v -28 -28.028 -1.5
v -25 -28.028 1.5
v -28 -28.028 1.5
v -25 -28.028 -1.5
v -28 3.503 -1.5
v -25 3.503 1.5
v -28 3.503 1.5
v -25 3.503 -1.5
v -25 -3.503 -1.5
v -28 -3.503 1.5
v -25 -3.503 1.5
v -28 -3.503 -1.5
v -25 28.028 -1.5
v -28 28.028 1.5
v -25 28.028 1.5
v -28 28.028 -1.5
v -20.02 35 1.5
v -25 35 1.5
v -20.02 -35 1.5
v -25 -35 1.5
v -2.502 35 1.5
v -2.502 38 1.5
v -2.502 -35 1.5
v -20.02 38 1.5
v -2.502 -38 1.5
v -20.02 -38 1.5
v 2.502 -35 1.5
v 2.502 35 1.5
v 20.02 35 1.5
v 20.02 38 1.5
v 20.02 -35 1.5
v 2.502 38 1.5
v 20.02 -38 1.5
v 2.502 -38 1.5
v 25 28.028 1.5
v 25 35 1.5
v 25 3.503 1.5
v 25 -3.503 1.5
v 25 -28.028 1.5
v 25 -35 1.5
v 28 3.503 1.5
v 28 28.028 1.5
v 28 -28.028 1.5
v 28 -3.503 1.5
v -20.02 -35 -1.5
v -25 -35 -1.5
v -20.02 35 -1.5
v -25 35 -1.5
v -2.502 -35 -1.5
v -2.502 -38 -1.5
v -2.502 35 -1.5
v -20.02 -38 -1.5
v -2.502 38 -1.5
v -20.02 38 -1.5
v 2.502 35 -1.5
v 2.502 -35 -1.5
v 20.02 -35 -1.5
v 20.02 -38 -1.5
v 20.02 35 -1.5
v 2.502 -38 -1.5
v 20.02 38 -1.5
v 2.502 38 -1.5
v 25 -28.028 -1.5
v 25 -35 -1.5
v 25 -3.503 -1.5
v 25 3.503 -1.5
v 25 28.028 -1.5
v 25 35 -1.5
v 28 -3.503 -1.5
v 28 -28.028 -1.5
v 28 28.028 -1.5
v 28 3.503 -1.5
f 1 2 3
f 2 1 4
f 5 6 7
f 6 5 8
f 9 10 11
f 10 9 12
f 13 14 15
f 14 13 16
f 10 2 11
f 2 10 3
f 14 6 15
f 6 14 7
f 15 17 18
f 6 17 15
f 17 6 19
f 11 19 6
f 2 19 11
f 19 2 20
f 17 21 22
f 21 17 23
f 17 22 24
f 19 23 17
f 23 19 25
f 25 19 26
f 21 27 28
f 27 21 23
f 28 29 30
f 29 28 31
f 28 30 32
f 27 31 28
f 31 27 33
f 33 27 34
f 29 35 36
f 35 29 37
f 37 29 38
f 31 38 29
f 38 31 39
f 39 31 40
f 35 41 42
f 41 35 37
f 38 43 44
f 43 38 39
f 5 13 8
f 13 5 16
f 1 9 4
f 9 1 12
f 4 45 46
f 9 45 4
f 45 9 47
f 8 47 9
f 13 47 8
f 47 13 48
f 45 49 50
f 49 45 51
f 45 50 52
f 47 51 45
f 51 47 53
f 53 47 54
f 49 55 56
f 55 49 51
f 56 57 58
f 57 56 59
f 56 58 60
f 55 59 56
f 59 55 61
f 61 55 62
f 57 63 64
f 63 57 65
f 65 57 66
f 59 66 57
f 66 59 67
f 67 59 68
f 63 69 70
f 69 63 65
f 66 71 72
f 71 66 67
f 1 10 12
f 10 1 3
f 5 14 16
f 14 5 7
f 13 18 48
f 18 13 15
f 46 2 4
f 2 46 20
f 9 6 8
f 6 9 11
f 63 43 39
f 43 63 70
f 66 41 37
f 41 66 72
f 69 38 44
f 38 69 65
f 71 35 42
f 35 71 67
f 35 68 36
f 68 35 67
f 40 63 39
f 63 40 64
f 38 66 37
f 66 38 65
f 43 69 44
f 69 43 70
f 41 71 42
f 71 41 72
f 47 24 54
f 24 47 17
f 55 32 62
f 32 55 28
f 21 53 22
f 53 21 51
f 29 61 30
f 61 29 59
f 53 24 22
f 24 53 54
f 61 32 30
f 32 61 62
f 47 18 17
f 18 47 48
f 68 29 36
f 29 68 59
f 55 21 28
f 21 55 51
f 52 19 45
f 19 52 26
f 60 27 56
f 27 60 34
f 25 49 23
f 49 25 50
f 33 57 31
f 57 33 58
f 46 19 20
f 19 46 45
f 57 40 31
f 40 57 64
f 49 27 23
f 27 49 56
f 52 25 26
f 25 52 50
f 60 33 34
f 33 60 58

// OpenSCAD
// file: noses.scad
include <config.scad>;

/**
 * Generates configured number of noses
 * centered, along X axis, to normalized total length of 1
 */
module nose_positive()
{
    begin_x = -0.5;
    delta_x = (1-relative_nose_length) / (nose_count-1);
    for (i=[0:nose_count-1])
    {
        translate([
            begin_x + i*delta_x,
            -material_z/2,
            -material_z/2
            ])
        cube([
            relative_nose_length,
            material_z,
            material_z
            ]);
    }
}

/**
 * Generates the counterpart to nose_positive()
 */
module nose_negative()
{
    // subtract nose_positive() from centered cuboid
    difference()
    {
        translate([
            -0.5,
            -material_z/2,
            -material_z/2
            ])
        cube([
            1,
            material_z,
            material_z
            ]);
        // a little overscale to get rid of rendering artifacts
        scale([
            1.001,
            1.001,
            1.001
            ])
        nose_positive();
    }
}

nose_negative();
// file: config.scad
// all measures in mm

/*
 * Base material to cut from
 */
material_x = 510;
material_y = 370;
material_z = 3;

/*
 * Shark model measures
 */
shark_length = 100;

/*
 * Cuboid measures (inside)
 */
cuboid_x = shark_length / 2;
cuboid_y = cuboid_x+20;
cuboid_z = cuboid_x+40;

/*
 * Save some calculations
 */
cuboid_x_2 = cuboid_x / 2;
cuboid_y_2 = cuboid_y / 2;
cuboid_z_2 = cuboid_z / 2;
material_z_2 = material_z / 2;

/*
 * Nose properties
 */
// the number
nose_count = 3;
// width of a nose relative to length of the corresponding edge
relative_nose_length = 0.1;

/*
 * Rendering and projection properties
 */
// how far apart from on another to project the parts
projection_spacing = 1;
// rendering quality (face number)
$fn = 50;
// main file
include <config.scad>;
use <noses.scad>;

/**
 * Generate the top and bottom face of the cuboid
 * with noses, centered around origin
 */
module face_xy()
{
    color("blue")
    {
        cube([
            cuboid_x,
            cuboid_y,
            material_z
            ], center=true);

        rotate([
            0,
            0,
            90
            ])
        scale([
            cuboid_y,
            1,
            1
            ])
        {
            translate([
                0,
                cuboid_x_2 + material_z_2,
                0
                ])
            nose_negative();

            translate([
                0,
                - cuboid_x_2 - material_z_2,
                0
                ])
            nose_negative();
        }

        scale([
            cuboid_x,
            1,
            1
            ])
        {
            translate([
                0,
                cuboid_y_2 + material_z_2,
                0
                ])
            nose_negative();

            translate([
                0,
                - cuboid_y_2 - material_z_2,
                0
                ])
            nose_negative();
        }
    }
}

face_xy();
